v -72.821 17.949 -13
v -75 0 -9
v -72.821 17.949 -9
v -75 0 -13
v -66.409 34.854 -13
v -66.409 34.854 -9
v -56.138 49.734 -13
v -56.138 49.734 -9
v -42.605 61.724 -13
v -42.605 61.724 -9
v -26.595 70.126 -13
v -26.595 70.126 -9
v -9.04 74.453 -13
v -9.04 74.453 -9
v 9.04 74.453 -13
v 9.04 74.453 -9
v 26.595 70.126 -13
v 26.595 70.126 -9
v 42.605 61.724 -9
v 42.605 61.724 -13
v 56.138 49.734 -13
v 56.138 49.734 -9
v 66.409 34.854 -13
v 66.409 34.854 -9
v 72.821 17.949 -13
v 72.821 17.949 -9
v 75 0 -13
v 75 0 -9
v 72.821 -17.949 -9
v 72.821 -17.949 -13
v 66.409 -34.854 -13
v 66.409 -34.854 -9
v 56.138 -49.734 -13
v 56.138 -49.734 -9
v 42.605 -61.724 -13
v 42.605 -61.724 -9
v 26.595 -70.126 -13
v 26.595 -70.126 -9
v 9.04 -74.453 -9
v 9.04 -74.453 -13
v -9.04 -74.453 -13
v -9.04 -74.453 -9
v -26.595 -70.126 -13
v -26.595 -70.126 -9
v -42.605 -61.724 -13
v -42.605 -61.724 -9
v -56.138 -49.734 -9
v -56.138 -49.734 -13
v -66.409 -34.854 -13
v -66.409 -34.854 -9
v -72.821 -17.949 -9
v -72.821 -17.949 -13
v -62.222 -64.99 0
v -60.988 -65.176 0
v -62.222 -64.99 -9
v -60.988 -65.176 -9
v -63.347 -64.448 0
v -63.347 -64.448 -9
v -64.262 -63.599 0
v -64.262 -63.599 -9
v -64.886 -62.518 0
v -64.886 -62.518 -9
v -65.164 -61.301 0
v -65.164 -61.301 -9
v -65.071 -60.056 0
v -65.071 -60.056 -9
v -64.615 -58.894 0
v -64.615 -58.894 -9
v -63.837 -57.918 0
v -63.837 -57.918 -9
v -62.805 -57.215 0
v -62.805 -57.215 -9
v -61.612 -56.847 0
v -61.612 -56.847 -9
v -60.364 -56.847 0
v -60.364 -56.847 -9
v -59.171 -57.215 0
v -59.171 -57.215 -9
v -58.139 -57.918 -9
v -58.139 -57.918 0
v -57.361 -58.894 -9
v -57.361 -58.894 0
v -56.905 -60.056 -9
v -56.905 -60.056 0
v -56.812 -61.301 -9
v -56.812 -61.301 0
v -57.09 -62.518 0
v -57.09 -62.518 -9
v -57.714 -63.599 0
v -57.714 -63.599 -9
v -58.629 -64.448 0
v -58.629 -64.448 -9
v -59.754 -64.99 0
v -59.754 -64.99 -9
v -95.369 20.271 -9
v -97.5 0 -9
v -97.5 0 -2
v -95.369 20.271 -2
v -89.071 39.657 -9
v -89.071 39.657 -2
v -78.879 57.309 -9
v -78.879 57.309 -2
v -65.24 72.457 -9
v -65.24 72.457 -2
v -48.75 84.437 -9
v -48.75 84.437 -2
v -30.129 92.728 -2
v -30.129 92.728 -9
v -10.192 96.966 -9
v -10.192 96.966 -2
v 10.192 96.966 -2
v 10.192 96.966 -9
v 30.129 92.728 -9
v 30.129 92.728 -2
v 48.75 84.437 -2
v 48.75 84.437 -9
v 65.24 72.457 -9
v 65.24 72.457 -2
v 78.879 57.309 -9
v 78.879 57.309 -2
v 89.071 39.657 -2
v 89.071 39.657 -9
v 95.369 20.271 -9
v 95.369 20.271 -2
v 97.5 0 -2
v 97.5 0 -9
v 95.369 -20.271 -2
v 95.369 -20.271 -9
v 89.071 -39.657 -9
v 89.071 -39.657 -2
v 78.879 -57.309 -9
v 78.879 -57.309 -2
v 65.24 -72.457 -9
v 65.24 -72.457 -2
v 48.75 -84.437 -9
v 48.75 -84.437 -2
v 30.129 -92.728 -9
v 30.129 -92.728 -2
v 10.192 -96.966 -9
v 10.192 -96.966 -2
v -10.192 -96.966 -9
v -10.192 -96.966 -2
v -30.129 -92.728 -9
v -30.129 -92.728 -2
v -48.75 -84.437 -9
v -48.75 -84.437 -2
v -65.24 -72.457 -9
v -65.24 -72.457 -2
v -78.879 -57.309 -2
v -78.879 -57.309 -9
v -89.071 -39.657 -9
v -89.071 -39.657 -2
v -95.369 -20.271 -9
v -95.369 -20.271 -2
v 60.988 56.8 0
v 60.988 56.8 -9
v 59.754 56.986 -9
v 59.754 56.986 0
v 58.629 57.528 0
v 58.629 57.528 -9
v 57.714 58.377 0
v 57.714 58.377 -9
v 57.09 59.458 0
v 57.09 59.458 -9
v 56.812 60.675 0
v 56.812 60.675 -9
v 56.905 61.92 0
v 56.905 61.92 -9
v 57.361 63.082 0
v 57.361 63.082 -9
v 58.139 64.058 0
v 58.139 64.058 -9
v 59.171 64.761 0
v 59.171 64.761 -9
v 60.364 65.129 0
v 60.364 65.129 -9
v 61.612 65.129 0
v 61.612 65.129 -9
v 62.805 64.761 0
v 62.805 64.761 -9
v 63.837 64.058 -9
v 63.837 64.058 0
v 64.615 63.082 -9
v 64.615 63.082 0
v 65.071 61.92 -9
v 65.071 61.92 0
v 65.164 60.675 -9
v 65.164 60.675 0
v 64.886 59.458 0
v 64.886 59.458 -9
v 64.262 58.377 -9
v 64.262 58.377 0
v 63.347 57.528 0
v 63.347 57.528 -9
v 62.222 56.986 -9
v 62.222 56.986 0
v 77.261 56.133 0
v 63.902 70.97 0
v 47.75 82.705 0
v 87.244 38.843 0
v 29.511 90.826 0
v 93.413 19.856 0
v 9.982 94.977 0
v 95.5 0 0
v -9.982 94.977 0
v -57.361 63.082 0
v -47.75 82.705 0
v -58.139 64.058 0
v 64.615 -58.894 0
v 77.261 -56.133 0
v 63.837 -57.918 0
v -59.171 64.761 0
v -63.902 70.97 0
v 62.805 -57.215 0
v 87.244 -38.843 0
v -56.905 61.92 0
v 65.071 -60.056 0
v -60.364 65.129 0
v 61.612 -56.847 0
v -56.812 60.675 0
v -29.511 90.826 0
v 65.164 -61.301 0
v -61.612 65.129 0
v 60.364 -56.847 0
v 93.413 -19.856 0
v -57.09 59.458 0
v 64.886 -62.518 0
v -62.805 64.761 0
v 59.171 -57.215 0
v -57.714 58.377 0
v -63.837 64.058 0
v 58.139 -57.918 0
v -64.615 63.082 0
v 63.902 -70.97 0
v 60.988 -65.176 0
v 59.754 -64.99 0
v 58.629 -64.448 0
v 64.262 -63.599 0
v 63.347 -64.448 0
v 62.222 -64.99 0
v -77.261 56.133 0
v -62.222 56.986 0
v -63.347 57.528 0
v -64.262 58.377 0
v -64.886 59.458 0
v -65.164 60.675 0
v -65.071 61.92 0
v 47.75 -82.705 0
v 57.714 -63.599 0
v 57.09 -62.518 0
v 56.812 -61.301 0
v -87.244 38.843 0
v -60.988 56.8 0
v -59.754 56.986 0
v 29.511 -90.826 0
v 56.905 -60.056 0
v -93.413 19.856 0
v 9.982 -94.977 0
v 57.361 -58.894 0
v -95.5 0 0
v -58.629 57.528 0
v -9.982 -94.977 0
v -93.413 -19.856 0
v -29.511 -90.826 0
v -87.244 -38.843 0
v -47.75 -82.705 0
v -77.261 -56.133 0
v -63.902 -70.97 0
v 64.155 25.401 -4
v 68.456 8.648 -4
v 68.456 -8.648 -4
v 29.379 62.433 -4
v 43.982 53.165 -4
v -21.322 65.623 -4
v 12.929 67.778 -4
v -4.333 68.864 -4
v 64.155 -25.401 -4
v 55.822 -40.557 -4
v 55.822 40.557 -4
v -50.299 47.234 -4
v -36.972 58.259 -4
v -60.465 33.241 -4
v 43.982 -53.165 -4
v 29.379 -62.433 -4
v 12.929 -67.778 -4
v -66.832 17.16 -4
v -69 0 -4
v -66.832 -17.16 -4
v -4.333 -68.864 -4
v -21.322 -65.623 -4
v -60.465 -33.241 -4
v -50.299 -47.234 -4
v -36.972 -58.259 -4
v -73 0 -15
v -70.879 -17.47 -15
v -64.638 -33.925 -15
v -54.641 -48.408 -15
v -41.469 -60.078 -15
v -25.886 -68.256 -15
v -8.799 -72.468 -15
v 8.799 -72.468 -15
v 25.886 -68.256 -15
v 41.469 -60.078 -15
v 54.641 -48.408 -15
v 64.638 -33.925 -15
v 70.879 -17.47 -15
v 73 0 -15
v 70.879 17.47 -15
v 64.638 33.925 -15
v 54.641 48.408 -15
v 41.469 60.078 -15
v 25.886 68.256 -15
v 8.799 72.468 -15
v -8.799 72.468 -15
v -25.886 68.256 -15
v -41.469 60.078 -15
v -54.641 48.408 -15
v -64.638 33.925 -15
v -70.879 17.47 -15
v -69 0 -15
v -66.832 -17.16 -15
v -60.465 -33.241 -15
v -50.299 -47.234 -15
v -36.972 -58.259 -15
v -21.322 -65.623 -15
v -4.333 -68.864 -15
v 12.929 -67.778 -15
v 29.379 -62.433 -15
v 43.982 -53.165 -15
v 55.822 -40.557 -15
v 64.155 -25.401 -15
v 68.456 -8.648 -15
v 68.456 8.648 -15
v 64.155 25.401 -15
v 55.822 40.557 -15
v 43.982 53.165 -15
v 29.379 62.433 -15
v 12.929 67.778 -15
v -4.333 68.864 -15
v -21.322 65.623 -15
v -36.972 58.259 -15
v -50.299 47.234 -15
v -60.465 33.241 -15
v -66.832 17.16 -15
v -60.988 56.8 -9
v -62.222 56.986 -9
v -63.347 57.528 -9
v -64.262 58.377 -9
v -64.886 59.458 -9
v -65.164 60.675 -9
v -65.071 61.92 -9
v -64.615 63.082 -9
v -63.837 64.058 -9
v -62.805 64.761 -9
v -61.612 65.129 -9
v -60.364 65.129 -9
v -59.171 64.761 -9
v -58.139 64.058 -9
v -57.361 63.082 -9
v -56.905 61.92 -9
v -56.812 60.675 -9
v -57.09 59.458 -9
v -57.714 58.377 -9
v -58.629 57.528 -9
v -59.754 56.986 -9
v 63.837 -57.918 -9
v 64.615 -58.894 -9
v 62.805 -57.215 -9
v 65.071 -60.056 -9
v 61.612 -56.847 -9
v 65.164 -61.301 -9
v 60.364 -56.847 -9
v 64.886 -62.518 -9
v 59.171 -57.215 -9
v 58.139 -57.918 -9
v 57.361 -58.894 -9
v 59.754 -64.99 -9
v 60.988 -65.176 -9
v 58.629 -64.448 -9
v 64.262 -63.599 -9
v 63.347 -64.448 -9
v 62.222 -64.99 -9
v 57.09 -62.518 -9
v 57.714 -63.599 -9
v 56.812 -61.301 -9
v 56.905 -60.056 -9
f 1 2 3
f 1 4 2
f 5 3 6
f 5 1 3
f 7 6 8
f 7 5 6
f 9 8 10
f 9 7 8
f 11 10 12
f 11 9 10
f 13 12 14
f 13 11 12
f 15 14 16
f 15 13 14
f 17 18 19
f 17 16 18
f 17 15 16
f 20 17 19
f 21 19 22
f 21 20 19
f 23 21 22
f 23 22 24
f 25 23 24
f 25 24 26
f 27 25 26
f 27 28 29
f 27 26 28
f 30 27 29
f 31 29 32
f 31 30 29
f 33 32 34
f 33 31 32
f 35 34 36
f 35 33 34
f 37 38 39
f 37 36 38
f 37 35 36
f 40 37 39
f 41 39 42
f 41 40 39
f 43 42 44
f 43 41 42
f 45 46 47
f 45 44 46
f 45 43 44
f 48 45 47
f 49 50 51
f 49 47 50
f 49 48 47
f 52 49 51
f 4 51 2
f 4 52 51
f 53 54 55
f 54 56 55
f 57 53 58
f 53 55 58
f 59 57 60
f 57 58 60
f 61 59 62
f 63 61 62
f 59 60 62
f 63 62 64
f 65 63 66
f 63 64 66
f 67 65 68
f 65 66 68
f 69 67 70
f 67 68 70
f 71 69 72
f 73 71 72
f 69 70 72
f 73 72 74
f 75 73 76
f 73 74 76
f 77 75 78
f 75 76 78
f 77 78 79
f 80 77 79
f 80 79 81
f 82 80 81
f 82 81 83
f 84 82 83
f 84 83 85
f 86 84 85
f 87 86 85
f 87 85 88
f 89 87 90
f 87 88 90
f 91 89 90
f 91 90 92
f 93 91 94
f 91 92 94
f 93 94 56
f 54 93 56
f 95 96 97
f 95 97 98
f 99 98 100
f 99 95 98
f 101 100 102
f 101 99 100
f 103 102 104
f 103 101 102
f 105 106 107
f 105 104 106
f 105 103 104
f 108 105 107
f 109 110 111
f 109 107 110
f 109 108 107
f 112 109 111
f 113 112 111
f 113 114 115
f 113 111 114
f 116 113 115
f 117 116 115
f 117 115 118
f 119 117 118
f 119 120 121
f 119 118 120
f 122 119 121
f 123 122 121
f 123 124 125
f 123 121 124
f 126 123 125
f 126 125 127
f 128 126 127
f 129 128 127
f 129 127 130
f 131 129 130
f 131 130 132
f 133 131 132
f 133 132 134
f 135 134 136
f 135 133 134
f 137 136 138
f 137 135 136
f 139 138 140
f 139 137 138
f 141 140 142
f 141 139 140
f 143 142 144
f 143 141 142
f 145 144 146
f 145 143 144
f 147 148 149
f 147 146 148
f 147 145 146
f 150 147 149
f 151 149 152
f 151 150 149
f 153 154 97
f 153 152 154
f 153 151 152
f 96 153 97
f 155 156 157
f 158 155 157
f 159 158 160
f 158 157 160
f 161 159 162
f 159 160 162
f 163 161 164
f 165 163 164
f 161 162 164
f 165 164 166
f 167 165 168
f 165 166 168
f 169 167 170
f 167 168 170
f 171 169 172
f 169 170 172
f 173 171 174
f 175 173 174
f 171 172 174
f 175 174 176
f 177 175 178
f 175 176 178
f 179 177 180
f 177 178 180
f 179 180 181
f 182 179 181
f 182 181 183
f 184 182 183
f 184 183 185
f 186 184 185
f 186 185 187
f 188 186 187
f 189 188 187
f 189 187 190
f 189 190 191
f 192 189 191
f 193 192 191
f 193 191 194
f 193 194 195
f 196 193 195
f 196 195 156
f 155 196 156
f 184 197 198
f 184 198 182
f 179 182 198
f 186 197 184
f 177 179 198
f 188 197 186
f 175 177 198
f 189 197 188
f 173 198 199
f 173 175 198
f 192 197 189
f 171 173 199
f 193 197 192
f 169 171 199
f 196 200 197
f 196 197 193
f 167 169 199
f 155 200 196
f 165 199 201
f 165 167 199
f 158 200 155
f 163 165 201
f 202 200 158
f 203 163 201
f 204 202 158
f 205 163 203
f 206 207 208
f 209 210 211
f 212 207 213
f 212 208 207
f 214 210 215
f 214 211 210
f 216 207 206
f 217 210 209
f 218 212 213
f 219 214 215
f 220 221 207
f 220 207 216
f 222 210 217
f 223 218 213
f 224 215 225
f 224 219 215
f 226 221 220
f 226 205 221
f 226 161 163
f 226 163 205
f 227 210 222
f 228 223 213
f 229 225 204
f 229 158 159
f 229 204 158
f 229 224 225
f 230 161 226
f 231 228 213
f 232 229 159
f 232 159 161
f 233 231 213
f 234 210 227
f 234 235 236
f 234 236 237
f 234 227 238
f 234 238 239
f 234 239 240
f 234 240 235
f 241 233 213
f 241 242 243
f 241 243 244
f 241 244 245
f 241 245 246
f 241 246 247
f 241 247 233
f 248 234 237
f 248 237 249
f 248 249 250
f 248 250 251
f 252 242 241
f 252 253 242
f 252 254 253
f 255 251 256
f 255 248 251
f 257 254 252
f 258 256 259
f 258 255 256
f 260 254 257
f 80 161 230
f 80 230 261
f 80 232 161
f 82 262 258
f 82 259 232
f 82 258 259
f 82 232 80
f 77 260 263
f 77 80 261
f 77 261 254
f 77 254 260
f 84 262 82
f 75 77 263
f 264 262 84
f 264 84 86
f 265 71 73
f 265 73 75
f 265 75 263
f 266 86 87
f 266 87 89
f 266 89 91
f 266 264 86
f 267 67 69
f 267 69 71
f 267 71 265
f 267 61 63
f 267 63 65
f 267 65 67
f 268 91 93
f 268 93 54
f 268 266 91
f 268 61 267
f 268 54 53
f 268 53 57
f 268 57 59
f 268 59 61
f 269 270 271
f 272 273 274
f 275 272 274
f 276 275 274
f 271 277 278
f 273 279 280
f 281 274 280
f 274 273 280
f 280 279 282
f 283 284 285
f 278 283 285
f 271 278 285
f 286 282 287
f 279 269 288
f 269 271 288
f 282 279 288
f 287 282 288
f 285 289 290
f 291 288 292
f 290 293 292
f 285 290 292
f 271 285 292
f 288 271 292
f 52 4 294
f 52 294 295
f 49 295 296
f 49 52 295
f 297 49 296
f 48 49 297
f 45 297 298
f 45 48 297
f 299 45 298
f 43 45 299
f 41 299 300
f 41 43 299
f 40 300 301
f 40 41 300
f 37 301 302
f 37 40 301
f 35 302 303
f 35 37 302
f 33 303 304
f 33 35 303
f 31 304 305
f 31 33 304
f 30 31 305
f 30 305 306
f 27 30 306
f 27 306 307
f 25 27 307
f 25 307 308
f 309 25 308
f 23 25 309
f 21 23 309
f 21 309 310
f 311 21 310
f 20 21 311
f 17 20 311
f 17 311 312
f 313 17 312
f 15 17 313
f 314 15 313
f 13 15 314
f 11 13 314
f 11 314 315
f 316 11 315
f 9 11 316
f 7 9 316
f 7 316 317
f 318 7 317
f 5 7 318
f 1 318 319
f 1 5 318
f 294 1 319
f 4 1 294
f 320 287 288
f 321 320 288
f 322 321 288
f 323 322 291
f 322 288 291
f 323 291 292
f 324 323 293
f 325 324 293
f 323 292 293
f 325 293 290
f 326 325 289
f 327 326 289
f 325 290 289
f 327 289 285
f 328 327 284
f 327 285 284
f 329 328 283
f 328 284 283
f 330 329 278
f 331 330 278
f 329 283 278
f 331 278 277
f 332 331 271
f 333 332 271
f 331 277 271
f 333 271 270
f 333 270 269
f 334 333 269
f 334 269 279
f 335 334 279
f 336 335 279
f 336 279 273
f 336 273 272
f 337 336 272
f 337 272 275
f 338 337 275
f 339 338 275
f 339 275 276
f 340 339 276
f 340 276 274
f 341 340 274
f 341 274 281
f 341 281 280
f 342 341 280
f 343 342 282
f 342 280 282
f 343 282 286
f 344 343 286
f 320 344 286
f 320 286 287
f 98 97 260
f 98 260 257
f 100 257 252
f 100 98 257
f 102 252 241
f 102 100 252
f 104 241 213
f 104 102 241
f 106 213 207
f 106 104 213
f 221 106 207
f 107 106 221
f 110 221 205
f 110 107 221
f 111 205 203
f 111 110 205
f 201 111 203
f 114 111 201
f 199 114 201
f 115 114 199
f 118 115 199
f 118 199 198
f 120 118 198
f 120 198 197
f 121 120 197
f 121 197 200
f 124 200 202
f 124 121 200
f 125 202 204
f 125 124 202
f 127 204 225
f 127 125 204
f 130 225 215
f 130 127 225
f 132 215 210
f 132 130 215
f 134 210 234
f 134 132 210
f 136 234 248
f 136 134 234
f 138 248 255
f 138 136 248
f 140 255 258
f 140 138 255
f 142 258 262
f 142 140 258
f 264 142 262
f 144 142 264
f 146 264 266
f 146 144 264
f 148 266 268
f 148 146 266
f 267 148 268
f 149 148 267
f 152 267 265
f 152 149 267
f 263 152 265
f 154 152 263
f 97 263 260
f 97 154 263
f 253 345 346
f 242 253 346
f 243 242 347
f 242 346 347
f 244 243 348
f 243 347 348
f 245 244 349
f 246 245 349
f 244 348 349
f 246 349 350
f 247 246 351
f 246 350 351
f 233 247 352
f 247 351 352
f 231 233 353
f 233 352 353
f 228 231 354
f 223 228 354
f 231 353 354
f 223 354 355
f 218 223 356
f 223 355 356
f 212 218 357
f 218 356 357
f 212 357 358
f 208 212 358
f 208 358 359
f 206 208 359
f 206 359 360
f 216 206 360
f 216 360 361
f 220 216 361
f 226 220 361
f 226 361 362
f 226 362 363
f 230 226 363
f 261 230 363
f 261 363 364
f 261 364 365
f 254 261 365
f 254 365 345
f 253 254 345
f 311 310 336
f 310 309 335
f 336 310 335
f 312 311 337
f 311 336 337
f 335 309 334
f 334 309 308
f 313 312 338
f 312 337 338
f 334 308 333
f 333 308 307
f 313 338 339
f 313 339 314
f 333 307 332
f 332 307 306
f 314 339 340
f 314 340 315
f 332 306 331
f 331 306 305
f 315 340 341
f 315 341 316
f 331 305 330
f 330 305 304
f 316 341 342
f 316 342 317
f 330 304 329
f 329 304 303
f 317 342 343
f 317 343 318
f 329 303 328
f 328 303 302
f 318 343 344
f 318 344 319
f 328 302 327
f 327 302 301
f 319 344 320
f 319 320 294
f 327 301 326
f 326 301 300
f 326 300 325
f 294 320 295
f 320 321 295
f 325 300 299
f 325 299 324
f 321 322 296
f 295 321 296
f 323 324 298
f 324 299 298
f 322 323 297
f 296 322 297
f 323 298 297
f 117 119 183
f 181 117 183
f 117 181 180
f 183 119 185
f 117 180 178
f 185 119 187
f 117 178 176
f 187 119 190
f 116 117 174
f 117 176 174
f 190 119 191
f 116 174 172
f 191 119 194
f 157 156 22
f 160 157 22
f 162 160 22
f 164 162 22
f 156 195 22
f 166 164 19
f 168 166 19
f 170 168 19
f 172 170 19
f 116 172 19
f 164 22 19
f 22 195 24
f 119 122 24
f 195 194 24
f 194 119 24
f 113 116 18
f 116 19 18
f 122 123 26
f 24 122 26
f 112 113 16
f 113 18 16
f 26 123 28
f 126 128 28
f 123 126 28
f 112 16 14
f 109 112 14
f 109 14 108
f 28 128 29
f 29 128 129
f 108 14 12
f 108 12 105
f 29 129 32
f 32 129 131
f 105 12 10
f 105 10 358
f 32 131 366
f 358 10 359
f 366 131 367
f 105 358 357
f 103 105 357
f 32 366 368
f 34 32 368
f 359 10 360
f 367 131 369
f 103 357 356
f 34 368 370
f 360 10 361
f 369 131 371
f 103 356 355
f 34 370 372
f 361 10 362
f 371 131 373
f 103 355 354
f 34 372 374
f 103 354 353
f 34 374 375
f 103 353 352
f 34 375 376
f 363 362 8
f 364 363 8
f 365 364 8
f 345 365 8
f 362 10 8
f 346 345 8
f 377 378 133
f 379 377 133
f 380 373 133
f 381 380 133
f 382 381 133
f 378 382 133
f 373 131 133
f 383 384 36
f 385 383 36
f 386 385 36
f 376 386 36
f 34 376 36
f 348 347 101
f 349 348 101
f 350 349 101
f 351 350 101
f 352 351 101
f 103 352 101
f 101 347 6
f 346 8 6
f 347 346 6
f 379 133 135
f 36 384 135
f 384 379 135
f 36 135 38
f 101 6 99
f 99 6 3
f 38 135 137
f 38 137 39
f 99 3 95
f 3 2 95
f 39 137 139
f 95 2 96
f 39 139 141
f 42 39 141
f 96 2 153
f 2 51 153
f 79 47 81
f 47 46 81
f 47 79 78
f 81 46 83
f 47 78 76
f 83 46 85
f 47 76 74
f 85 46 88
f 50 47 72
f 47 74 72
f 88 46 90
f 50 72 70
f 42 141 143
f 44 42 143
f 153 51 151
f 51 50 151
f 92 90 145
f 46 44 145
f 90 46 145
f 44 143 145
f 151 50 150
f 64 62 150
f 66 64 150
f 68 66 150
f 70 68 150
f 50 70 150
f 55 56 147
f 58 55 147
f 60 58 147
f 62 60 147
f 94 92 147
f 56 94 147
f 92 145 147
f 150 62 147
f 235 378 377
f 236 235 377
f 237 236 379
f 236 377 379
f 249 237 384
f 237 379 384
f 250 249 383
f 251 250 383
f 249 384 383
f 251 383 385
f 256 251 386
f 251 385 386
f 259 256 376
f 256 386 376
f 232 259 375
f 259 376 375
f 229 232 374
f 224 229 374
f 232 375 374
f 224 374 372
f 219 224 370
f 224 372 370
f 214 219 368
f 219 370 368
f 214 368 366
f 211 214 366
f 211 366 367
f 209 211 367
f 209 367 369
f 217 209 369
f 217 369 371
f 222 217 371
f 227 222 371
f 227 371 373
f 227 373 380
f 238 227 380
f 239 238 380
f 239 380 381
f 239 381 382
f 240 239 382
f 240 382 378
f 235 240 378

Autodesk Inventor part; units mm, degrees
ref_plane "YZ Plane" through (0, 0, 0) normal (1, 0, 0) x (0, 1, 0)
ref_plane "XZ Plane" through (0, 0, 0) normal (0, 1, 0) x (-1, 0, 0)
ref_plane "XY Plane" through (0, 0, 0) normal (0, 0, 1) x (1, 0, 0)
sketch "Эскиз1" plane through (0, 0, 0) normal (0, 1, 0) x (-1, 0, 0)
  line L0 (0, 0) -> (97.5, 0)
  line L1 (97.5, 0) -> (97.5, -9)
  line L2 (97.5, -9) -> (75, -9)
  line L3 (75, -9) -> (75, -15)
  line L4 (0, -4) -> (0, 0)
  line L5 (75, -15) -> (69, -15)
  line L6 (69, -15) -> (69, -4)
  line L7 (69, -4) -> (0, -4)
  dimension "d0" = 195
  dimension "d1" = 150
  dimension "d3" = 9
  dimension "d5" = 15
  dimension "d6" = 138
  dimension "d7" = 4
revolve "Вращение1" add sketch "Эскиз1" angle 360 about axis through (0, 0, -4) along (0, 0, 1)
sketch "Эскиз3" plane through (0, 0, 0) normal (0, 0, 1) x (1, 0, 0)
  circle A0 centre (0, 0) radius 86.25 construction
  line L0 (0, 0) -> (-91.162, -91.162) construction
  line L1 (0, 0) -> (128.9225, 0) construction
  point P0 (0, 0)
  point P1 (-60.988, -60.988)
  point P2 (60.988, -60.988)
  point P3 (60.988, 60.988)
  point P4 (-60.988, 60.988)
  dimension "d15" = 172.5
  dimension "d16" = 135
  dimension "d19" = 360
hole "Отверстие1" at (-60.988, -60.988, 0) at (60.988, -60.988, 0) at (60.988, 60.988, 0) at (-60.988, 60.988, 0) direction (0, 0, -1) diameter 8.376 end through all thread size "M10x1.5" class "6H" standard "ISO Metric profile"
chamfer "Фаска1" distance 2 angle 45 2 edges at (75, 0, -15) (97.5, 0, 0)
properties part number "МПСТ Крышка подшипника глухая 150" material "Сталь, углеродистая"
